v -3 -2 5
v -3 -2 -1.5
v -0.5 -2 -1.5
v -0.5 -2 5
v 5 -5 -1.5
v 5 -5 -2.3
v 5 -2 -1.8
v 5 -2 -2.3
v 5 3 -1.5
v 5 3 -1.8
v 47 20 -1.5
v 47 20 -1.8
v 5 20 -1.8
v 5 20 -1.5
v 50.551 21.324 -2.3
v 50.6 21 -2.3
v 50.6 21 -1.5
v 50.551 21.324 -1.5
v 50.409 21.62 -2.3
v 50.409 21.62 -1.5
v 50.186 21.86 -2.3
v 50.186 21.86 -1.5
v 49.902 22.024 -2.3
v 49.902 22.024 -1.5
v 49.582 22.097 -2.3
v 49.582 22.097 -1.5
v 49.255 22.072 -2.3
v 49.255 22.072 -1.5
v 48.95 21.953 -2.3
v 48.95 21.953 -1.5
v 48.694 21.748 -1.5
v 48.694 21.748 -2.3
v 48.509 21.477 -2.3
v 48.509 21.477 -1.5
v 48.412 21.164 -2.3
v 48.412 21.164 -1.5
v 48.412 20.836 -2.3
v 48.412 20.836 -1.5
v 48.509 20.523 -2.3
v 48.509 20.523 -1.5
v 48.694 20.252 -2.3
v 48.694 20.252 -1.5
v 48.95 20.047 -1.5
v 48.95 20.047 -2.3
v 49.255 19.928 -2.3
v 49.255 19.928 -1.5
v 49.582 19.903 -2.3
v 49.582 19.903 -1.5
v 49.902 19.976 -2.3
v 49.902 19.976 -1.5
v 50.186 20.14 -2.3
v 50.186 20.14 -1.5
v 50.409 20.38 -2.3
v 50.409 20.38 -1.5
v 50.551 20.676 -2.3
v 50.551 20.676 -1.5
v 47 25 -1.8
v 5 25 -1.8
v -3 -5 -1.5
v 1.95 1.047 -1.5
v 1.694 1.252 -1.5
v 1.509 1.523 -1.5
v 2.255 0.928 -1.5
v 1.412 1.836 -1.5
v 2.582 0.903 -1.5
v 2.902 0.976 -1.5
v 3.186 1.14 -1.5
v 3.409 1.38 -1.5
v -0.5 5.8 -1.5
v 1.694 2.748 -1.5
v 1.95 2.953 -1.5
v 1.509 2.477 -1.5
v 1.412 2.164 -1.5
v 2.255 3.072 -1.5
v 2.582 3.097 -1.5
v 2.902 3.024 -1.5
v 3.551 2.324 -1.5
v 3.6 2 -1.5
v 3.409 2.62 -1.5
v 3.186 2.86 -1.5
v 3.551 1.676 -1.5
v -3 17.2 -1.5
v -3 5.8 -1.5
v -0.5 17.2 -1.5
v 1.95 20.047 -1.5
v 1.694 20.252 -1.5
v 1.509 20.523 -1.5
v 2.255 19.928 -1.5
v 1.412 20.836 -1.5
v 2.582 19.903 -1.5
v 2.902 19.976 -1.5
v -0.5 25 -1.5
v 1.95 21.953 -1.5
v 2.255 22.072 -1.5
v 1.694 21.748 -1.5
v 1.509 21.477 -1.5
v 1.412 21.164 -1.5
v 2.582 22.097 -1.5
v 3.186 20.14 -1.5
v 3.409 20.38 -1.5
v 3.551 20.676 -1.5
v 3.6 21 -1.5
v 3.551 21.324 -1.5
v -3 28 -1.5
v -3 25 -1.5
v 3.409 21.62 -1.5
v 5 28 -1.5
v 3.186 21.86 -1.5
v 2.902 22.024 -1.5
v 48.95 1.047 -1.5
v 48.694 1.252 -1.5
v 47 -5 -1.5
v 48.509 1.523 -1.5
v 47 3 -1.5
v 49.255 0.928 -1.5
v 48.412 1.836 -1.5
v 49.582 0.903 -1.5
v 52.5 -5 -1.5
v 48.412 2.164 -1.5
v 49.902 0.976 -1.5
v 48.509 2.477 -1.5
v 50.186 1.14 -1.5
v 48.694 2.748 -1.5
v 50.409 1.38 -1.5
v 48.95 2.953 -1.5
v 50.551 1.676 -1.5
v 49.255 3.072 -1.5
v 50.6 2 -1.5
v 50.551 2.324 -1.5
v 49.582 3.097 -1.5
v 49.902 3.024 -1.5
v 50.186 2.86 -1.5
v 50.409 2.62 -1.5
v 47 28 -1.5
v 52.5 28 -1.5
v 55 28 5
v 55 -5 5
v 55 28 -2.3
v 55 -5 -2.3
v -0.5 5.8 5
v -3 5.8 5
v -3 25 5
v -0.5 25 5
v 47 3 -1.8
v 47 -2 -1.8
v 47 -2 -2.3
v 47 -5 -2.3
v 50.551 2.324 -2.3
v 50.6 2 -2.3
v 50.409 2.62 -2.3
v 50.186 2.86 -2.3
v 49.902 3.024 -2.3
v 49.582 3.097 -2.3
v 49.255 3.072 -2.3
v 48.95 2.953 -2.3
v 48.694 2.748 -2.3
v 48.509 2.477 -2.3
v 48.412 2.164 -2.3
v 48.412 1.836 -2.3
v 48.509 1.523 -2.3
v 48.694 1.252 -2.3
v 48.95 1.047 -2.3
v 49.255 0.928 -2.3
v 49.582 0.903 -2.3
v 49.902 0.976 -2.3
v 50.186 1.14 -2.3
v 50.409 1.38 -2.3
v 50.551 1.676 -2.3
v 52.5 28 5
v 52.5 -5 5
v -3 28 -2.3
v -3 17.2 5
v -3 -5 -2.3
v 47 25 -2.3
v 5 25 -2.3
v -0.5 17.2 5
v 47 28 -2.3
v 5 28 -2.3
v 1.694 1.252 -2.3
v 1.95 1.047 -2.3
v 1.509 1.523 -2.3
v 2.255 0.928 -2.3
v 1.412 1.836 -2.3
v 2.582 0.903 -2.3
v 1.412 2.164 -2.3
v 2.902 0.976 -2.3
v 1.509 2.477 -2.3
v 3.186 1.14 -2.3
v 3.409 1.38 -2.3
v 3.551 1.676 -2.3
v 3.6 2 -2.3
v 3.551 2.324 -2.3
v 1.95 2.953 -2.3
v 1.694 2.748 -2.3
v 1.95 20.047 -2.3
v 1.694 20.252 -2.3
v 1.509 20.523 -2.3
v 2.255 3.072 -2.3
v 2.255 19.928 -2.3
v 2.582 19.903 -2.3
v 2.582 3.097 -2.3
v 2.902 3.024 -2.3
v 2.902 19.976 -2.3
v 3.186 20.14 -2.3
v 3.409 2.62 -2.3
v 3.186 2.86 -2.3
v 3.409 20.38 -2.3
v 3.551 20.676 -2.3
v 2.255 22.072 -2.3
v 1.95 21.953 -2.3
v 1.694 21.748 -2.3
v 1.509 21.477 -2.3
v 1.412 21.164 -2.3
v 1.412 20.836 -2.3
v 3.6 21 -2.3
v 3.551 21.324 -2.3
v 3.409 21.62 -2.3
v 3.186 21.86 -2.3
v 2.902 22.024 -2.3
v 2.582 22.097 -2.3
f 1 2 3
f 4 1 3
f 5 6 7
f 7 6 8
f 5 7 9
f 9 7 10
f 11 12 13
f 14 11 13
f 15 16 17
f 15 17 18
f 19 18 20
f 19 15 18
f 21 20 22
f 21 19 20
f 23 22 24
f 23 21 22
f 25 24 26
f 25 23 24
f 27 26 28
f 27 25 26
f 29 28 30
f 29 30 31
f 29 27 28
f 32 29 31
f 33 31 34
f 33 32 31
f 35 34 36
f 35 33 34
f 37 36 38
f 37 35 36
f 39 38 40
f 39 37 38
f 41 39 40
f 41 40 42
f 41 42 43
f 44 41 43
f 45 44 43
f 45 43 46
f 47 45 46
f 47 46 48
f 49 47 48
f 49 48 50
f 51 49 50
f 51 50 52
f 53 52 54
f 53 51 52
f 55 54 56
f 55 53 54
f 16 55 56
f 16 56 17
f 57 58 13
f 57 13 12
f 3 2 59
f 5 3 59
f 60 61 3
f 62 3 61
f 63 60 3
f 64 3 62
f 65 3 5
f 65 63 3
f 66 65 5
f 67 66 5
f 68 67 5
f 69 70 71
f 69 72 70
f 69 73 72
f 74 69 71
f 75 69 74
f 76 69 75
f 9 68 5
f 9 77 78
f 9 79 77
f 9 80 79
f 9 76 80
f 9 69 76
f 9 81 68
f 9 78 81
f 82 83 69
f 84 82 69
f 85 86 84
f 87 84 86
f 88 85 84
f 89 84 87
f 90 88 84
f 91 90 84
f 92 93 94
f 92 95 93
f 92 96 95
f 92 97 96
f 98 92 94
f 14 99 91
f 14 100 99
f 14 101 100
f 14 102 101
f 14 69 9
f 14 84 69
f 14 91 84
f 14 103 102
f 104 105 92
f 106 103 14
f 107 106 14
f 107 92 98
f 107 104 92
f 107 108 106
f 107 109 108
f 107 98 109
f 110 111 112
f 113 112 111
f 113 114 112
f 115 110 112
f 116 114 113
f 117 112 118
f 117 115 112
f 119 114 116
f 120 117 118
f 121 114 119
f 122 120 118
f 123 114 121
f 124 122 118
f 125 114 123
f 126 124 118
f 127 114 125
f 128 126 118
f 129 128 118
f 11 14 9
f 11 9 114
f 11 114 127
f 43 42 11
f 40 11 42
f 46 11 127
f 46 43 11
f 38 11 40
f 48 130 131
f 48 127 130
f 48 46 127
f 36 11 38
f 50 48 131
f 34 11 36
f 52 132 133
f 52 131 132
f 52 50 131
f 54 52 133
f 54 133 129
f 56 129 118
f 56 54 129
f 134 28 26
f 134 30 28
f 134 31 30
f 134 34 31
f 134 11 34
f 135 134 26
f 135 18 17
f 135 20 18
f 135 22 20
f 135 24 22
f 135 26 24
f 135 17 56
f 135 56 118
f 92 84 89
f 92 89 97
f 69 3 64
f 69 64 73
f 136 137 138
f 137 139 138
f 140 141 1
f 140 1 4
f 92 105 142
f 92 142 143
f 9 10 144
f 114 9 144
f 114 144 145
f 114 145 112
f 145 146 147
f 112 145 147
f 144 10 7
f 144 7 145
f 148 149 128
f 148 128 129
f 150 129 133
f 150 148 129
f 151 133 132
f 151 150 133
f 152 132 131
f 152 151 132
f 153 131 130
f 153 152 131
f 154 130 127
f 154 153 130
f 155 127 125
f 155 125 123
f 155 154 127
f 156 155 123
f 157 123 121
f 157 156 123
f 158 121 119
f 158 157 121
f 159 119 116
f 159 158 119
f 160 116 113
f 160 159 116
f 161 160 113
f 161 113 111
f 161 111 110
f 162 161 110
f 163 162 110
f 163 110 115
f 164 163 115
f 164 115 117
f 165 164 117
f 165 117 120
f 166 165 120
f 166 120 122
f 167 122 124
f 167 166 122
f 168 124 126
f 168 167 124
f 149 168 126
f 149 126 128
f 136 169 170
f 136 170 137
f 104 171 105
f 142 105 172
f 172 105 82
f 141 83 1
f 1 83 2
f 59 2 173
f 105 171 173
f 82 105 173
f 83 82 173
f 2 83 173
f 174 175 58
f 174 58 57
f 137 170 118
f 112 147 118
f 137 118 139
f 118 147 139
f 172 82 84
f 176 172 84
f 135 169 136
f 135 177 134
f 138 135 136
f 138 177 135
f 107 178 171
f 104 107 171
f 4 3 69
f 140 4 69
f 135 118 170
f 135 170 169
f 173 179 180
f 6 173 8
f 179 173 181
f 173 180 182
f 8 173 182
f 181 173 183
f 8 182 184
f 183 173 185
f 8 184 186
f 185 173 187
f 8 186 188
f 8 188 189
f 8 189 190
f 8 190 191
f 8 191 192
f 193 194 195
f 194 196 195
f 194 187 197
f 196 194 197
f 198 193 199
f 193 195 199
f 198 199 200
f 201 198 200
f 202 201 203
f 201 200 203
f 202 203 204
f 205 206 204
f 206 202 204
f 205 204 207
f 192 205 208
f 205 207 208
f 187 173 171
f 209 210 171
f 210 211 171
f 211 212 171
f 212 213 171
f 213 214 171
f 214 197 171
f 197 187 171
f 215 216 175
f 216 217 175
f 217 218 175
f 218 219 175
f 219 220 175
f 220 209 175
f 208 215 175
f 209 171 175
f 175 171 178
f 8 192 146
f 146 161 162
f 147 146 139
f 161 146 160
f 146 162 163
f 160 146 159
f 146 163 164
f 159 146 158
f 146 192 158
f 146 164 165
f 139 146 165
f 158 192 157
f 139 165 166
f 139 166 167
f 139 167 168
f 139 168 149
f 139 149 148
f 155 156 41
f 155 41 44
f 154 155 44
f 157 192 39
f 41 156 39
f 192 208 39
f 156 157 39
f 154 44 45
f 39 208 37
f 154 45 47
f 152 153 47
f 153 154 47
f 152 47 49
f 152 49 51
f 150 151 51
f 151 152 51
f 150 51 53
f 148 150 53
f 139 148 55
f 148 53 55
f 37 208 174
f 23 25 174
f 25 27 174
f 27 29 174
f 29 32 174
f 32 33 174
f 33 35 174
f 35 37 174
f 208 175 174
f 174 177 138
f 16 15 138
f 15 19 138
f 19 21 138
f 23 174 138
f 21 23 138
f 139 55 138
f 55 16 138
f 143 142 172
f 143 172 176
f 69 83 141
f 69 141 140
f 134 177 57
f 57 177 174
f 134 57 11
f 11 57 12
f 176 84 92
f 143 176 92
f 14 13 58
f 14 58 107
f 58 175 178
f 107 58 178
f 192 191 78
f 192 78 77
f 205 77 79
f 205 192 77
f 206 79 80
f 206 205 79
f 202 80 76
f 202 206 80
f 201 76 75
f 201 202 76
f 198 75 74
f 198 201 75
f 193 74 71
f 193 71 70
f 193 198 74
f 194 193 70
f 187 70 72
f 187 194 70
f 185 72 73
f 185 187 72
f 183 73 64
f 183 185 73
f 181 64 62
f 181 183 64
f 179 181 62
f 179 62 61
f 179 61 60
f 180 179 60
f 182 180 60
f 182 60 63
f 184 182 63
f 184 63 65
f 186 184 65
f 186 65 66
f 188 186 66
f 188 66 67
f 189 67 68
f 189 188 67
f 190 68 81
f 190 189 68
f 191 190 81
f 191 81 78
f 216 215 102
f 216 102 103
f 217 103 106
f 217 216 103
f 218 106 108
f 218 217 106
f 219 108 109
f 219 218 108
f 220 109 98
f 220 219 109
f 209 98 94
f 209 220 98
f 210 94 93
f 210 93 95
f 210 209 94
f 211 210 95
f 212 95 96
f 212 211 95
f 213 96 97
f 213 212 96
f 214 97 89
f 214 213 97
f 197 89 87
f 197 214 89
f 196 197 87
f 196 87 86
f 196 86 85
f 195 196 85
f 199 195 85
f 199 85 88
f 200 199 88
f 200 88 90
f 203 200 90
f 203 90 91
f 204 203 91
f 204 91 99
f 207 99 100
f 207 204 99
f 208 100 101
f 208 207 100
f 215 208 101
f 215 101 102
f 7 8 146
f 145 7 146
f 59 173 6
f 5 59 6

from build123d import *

# Parameters (mm, degrees)
SKETCH1_R           = 1.1
BOSS_EXTRUDE1_DEPTH = 0.8
SKETCH2_W           = 42
SKETCH2_H           = 27
BOSS_EXTRUDE2_DEPTH = 0.5
SKETCH3_W           = 2.5
SKETCH3_H           = 33
SKETCH3_H_2         = 7.8
BOSS_EXTRUDE3_DEPTH = 6.5


with BuildPart() as part:
    # Sketch1 → Boss-Extrude1 (new body)
    with BuildSketch(Plane.XY.offset(-2.3)):
        Polygon((52, -5), (55, -5), (55, 28), (52, 28), (47, 28), (47, 20), (5, 20), (5, 28), (0, 28), (-3, 28), (-3, -5), (0, -5), (5, -5), (5, 3), (47, 3), (47, -5), align=None)
        with Locations((49.5, 2)):
            Circle(SKETCH1_R, mode=Mode.SUBTRACT)
        with Locations((49.5, 21)):
            Circle(SKETCH1_R, mode=Mode.SUBTRACT)
        with Locations((2.5, 2)):
            Circle(SKETCH1_R, mode=Mode.SUBTRACT)
        with Locations((2.5, 21)):
            Circle(SKETCH1_R, mode=Mode.SUBTRACT)
    extrude(amount=BOSS_EXTRUDE1_DEPTH)

    # Sketch2 → Boss-Extrude2 (add)
    with BuildSketch(Plane.XY.offset(-2.3)):
        with Locations((26, 11.5)):
            Rectangle(SKETCH2_W, SKETCH2_H)
    extrude(amount=BOSS_EXTRUDE2_DEPTH)

    # Sketch3 → Boss-Extrude3 (add)
    with BuildSketch(Plane.XY.offset(-1.5)):
        with Locations((53.75, 11.5)):
            Rectangle(SKETCH3_W, SKETCH3_H)
        with Locations((-1.75, 1.9)):
            Rectangle(SKETCH3_W, SKETCH3_H_2)
        with Locations((-1.75, 21.1)):
            Rectangle(SKETCH3_W, SKETCH3_H_2)
    extrude(amount=BOSS_EXTRUDE3_DEPTH)


solid = part.part
